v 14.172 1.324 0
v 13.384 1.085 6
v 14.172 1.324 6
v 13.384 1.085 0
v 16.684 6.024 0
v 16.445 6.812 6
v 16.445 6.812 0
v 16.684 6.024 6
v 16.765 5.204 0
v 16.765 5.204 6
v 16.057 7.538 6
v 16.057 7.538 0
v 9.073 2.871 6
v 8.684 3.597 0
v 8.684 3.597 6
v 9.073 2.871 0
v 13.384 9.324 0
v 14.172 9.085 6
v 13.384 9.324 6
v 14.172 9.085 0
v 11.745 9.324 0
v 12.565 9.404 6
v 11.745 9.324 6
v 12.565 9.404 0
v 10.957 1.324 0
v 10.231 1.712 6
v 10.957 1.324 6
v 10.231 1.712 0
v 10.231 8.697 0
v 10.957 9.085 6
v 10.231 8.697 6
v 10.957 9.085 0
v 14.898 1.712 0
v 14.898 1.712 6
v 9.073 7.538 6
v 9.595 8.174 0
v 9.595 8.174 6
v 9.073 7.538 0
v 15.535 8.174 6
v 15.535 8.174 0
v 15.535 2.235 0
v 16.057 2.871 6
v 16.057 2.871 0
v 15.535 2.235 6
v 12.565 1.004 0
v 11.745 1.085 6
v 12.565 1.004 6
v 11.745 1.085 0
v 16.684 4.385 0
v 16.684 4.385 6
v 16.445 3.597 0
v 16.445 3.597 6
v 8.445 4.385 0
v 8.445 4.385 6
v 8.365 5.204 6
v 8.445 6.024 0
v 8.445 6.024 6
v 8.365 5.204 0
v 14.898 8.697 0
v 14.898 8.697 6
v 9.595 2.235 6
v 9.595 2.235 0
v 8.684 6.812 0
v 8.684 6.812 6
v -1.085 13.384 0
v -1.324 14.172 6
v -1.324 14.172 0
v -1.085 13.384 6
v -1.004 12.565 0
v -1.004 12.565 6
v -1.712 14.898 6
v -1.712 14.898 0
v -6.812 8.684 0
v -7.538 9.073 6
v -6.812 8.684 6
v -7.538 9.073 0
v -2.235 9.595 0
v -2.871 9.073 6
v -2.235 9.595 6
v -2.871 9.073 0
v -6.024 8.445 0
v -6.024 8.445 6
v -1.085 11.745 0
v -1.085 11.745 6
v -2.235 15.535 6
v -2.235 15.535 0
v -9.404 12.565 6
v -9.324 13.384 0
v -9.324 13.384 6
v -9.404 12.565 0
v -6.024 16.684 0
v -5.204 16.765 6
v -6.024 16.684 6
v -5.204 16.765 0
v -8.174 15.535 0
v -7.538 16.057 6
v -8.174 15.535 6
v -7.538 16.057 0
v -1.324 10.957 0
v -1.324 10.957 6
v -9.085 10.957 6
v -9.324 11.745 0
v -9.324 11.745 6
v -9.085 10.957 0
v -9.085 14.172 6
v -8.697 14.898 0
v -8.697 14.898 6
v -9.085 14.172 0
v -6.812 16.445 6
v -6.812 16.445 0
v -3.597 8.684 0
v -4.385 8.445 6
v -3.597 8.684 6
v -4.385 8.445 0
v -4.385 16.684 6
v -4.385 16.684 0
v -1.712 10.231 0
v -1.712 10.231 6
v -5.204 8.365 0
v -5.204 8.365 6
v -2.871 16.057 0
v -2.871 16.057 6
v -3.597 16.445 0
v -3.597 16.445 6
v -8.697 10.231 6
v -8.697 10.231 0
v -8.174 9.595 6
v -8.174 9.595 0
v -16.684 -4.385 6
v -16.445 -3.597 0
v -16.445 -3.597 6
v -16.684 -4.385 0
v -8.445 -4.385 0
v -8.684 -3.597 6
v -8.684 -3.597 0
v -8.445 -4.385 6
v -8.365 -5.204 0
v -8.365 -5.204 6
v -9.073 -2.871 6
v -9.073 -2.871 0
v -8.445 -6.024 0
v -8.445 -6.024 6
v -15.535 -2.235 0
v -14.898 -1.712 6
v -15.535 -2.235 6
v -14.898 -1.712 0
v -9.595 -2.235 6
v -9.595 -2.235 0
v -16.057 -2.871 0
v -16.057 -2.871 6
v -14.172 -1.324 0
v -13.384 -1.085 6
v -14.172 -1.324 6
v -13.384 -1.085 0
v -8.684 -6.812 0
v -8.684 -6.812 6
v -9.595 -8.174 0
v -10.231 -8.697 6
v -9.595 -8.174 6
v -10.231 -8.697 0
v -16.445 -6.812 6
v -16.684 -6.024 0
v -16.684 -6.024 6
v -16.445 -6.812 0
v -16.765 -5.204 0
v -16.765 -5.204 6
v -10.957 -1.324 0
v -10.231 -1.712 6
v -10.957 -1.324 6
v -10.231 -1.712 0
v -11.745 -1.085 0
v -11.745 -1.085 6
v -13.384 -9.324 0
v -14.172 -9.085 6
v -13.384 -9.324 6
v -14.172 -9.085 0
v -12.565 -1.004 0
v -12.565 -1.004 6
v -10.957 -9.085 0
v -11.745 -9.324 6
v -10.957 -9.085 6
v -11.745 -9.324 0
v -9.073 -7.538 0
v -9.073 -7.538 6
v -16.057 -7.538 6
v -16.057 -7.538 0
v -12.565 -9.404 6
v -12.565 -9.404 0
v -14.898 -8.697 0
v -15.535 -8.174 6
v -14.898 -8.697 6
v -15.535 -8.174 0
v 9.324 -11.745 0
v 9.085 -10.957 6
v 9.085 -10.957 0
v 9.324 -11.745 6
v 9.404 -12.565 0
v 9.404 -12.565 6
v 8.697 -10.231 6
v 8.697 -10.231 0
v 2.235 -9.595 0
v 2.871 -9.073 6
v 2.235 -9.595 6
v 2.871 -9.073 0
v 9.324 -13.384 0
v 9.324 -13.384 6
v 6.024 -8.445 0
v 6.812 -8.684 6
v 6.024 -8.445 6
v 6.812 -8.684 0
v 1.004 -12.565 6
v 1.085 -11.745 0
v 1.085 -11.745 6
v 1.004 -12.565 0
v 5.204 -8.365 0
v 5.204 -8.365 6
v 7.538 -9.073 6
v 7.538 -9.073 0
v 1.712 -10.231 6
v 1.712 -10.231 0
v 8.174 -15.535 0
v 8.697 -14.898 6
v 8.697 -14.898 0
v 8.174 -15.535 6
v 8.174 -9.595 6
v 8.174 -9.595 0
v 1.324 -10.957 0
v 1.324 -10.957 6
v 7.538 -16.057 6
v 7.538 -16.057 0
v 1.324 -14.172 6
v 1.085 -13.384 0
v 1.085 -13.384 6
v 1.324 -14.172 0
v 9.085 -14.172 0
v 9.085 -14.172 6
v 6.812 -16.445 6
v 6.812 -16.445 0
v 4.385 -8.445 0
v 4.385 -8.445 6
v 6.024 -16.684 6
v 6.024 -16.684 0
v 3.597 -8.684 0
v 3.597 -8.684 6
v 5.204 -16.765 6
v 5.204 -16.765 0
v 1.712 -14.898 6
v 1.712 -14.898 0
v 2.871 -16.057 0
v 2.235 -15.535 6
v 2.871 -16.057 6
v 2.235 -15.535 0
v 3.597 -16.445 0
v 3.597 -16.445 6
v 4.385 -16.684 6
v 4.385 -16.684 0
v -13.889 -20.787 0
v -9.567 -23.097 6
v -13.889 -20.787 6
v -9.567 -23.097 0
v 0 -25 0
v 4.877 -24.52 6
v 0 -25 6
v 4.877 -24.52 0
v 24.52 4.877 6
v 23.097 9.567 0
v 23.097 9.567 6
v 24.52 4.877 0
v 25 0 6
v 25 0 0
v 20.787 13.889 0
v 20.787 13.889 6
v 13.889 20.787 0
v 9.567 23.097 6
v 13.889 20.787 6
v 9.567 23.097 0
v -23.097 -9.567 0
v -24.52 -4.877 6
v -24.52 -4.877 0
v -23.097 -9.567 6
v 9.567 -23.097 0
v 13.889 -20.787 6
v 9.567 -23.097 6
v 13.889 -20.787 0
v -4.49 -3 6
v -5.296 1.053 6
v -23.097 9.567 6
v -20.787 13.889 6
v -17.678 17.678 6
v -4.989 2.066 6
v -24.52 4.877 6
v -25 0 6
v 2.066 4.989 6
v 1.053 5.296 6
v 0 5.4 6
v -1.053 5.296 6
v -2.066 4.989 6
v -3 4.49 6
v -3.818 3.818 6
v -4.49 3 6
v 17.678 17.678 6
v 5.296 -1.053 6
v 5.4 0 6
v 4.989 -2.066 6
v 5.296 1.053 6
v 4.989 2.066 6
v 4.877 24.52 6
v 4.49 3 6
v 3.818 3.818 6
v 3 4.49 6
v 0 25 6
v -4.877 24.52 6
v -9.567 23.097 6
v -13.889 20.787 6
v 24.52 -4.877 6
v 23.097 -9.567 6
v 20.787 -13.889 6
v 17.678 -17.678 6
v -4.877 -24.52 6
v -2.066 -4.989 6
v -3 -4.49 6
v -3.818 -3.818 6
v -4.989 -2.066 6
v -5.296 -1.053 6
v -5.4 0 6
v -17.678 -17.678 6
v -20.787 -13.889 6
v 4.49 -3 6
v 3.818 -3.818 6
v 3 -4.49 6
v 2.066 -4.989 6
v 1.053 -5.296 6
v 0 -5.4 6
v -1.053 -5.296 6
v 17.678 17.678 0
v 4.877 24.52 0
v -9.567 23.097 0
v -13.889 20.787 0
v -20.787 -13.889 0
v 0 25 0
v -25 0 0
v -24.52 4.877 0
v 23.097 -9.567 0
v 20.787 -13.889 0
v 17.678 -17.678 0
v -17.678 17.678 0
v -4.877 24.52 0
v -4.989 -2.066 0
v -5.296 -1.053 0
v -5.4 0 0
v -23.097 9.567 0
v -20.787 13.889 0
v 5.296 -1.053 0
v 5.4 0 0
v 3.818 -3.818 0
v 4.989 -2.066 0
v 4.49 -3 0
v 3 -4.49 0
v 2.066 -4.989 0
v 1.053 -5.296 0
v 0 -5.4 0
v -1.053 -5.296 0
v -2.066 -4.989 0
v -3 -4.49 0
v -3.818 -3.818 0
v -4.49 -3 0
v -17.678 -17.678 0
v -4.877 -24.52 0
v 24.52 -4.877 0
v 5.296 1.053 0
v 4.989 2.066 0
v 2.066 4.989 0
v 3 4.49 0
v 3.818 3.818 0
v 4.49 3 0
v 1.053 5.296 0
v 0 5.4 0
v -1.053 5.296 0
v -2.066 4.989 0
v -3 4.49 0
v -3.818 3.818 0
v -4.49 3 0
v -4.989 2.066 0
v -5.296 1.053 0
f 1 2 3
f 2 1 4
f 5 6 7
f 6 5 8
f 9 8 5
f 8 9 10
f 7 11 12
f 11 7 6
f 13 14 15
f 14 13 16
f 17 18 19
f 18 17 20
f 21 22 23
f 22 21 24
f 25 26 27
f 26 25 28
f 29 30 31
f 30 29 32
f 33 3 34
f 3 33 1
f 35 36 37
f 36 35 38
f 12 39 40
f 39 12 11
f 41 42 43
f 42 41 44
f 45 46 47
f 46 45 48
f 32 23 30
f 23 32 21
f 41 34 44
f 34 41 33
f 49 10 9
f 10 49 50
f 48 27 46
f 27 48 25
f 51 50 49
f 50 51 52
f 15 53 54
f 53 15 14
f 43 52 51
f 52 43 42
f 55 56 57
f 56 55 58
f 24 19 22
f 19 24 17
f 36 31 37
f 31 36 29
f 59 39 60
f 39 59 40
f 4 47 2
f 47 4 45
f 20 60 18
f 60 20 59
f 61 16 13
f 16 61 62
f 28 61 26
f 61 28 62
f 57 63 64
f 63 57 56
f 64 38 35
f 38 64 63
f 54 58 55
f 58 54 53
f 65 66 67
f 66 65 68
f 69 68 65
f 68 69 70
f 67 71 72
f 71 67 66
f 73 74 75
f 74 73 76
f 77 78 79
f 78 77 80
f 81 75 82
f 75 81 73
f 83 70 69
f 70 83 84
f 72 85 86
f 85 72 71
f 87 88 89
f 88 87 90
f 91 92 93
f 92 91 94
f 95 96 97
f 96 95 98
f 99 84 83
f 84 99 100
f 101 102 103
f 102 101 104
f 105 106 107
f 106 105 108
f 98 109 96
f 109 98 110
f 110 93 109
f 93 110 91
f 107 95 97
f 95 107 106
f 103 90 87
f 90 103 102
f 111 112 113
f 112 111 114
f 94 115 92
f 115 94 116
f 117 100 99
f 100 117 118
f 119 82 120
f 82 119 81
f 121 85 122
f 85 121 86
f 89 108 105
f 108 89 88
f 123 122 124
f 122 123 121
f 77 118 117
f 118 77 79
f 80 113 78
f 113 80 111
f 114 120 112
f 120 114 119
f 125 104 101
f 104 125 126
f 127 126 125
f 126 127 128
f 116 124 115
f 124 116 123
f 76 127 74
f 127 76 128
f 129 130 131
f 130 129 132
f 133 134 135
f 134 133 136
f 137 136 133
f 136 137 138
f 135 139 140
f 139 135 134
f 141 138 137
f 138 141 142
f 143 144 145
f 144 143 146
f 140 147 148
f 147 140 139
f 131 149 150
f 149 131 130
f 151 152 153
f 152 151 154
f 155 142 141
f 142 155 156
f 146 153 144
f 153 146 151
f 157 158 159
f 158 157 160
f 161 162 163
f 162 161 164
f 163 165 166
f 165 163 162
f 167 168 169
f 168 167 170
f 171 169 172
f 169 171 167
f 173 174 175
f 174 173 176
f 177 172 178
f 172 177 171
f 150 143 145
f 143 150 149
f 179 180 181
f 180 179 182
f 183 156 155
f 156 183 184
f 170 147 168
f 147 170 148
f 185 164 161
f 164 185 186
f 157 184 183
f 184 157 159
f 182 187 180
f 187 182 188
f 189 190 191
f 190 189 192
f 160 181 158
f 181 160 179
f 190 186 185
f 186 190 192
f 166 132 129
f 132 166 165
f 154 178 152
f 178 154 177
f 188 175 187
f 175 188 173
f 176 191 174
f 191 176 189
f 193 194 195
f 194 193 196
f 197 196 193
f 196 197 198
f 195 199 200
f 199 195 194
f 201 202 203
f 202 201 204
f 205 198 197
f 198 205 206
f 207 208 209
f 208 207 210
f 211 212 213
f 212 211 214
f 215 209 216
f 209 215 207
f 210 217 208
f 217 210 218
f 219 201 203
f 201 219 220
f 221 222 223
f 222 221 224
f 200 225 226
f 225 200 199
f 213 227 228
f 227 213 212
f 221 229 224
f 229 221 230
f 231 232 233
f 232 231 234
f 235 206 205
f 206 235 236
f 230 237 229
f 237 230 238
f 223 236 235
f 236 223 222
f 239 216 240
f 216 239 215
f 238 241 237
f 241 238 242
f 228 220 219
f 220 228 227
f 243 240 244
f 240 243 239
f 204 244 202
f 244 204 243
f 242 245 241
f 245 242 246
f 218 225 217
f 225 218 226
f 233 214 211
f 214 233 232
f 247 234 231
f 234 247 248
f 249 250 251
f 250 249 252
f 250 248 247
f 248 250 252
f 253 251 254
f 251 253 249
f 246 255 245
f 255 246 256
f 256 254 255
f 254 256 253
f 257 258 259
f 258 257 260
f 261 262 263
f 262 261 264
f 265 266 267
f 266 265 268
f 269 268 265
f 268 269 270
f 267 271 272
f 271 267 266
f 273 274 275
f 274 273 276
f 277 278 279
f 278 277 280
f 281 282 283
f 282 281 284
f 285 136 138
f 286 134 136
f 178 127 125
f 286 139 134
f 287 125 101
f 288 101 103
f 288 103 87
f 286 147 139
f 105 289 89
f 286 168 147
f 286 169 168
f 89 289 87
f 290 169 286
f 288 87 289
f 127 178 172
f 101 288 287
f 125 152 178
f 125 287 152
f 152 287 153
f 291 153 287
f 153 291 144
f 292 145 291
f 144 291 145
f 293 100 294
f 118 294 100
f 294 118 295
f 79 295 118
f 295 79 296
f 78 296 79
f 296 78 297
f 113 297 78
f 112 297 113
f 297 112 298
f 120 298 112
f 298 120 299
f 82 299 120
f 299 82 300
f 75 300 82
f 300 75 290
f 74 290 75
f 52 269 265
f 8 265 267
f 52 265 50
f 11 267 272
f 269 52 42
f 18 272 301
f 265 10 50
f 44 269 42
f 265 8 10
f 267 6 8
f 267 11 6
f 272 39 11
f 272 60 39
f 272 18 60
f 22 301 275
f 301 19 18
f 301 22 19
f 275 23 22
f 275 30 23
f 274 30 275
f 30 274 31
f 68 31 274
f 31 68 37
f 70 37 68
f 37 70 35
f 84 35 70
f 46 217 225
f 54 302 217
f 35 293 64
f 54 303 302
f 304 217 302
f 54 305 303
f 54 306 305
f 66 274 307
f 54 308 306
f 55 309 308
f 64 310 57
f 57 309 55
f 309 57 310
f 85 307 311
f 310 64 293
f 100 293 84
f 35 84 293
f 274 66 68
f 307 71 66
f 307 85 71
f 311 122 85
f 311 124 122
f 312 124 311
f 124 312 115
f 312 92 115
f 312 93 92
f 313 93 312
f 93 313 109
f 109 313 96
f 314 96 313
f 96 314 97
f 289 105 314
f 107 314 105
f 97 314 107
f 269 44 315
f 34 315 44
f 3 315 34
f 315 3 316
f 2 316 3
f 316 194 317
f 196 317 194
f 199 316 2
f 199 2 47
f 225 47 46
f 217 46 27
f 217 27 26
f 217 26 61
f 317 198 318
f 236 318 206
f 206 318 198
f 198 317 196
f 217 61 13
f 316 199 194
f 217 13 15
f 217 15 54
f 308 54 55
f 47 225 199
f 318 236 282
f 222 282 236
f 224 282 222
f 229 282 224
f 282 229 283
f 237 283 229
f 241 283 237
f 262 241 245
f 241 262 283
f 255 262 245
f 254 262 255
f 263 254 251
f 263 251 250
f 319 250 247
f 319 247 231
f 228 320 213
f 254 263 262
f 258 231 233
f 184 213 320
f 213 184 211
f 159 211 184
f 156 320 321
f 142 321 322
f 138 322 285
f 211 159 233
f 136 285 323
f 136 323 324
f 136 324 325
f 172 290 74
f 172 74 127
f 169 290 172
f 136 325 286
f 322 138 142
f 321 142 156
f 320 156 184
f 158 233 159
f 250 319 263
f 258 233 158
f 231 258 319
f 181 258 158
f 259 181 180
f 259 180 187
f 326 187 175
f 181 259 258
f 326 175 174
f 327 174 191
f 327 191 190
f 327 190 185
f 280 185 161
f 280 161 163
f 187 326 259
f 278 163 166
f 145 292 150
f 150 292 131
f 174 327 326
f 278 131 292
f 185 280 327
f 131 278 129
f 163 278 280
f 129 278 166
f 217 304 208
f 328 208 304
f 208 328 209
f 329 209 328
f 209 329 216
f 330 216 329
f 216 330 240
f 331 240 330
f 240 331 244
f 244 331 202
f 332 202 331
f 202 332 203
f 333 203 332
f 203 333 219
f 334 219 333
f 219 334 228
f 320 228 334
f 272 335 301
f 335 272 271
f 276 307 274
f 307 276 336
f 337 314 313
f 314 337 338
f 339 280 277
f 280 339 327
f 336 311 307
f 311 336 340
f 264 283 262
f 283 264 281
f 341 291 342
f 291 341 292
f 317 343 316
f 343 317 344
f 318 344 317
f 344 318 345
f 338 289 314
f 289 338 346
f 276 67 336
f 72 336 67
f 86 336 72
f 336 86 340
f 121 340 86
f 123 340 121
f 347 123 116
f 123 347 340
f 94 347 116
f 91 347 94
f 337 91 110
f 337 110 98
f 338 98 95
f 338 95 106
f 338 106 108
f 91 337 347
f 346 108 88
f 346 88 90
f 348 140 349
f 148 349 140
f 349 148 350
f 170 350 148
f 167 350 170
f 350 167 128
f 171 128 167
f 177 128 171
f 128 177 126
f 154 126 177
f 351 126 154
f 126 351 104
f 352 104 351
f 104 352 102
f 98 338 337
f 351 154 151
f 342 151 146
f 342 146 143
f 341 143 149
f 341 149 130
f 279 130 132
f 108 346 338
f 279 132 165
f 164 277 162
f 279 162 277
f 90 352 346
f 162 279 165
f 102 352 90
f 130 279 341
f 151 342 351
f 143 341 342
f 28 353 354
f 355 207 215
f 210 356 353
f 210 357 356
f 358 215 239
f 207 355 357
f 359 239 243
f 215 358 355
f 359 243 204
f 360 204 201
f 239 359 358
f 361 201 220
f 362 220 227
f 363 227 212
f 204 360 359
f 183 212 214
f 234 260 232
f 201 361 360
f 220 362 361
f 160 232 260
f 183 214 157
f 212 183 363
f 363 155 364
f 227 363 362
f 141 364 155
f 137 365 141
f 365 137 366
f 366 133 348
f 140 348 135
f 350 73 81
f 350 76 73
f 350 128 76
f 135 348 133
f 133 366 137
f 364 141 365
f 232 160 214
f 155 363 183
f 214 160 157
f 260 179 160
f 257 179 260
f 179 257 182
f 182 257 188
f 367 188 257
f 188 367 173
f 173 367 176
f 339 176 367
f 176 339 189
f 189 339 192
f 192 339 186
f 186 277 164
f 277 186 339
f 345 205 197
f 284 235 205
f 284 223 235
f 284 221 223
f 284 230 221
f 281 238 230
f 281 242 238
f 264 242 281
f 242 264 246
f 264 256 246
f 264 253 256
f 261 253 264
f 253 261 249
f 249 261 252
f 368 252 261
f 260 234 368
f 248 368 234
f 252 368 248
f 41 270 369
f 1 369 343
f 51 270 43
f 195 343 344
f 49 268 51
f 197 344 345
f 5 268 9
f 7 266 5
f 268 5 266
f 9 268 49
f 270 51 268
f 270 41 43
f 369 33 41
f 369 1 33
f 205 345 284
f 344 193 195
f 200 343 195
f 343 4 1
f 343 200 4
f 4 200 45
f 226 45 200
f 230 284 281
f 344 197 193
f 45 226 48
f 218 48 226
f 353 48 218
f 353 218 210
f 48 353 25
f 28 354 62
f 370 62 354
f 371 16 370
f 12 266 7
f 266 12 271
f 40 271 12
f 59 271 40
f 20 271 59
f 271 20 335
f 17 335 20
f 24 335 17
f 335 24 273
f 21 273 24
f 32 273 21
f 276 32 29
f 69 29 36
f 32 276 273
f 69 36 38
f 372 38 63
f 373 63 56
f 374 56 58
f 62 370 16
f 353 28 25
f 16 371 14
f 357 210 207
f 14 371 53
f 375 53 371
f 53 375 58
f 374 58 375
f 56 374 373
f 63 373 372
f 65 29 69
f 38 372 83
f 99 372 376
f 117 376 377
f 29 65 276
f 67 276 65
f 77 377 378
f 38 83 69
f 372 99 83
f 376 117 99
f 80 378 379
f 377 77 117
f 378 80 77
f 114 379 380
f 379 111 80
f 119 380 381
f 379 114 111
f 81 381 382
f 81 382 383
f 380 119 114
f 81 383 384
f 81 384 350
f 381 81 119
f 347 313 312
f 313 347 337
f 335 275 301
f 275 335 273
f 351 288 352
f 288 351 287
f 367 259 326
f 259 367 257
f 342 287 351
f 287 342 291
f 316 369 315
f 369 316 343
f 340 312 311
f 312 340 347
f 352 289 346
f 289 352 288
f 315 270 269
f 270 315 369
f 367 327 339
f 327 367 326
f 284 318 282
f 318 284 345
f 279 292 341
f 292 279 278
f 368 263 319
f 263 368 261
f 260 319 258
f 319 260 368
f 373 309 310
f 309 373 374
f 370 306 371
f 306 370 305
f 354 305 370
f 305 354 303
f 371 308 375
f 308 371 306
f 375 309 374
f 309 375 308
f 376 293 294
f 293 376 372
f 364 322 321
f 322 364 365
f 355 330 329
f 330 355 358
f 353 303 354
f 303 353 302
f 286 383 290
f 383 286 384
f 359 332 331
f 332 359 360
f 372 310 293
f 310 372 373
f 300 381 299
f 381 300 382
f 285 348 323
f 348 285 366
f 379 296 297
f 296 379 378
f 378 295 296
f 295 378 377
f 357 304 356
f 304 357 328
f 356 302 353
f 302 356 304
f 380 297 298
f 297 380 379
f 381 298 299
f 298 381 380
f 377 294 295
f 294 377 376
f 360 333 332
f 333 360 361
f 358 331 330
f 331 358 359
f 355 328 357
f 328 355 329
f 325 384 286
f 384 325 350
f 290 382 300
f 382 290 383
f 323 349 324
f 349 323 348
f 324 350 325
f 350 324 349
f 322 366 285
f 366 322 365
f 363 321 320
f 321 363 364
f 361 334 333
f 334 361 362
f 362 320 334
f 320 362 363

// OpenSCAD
$fn = 32;

// ----------------------------------------------------------------------
// Flange Ø50 x 6
// 4 holes on a Ø27.2 bolt circle, bolted joints
// ----------------------------------------------------------------------

// --- parameters (mm) ---
flange_d = 50;     // outside diameter of the flange
thickness = 6;     // flange thickness
holes = 4;         // number of bolt holes
pcd = 27.2;        // bolt circle diameter
start_deg = 22.5;  // angle of the first hole, from +X
hole_d = 8.4;      // bolt hole diameter
bore_d = 10.8;     // central through bore
hub_d = 18.8;      // hub outside diameter
hub_h = 0;         // hub height above the flange face (0 = no hub)

// --- derived feature positions (mm) ---
height = thickness + hub_h;  // = 6   overall height of the part
pcd_r = pcd / 2;             // = 13.6   bolt circle radius
hole_step = 360 / holes;     // = 90   angular pitch
feature_centers = [
  [pcd_r * cos(start_deg + 0 * hole_step), pcd_r * sin(start_deg + 0 * hole_step)],
  [pcd_r * cos(start_deg + 1 * hole_step), pcd_r * sin(start_deg + 1 * hole_step)],
  [pcd_r * cos(start_deg + 2 * hole_step), pcd_r * sin(start_deg + 2 * hole_step)],
  [pcd_r * cos(start_deg + 3 * hole_step), pcd_r * sin(start_deg + 3 * hole_step)]
];   // bolt hole centres on the pitch circle

// flange disc, every hole and the bore cut straight through
difference() {
  union() {
    cylinder(d = flange_d, h = thickness);
  }
  translate([0, 0, -1]) cylinder(d = bore_d, h = height + 2);  // bore, through
  for (centre = feature_centers)
    translate([centre[0], centre[1], -1]) cylinder(d = hole_d, h = thickness + 2);
}
